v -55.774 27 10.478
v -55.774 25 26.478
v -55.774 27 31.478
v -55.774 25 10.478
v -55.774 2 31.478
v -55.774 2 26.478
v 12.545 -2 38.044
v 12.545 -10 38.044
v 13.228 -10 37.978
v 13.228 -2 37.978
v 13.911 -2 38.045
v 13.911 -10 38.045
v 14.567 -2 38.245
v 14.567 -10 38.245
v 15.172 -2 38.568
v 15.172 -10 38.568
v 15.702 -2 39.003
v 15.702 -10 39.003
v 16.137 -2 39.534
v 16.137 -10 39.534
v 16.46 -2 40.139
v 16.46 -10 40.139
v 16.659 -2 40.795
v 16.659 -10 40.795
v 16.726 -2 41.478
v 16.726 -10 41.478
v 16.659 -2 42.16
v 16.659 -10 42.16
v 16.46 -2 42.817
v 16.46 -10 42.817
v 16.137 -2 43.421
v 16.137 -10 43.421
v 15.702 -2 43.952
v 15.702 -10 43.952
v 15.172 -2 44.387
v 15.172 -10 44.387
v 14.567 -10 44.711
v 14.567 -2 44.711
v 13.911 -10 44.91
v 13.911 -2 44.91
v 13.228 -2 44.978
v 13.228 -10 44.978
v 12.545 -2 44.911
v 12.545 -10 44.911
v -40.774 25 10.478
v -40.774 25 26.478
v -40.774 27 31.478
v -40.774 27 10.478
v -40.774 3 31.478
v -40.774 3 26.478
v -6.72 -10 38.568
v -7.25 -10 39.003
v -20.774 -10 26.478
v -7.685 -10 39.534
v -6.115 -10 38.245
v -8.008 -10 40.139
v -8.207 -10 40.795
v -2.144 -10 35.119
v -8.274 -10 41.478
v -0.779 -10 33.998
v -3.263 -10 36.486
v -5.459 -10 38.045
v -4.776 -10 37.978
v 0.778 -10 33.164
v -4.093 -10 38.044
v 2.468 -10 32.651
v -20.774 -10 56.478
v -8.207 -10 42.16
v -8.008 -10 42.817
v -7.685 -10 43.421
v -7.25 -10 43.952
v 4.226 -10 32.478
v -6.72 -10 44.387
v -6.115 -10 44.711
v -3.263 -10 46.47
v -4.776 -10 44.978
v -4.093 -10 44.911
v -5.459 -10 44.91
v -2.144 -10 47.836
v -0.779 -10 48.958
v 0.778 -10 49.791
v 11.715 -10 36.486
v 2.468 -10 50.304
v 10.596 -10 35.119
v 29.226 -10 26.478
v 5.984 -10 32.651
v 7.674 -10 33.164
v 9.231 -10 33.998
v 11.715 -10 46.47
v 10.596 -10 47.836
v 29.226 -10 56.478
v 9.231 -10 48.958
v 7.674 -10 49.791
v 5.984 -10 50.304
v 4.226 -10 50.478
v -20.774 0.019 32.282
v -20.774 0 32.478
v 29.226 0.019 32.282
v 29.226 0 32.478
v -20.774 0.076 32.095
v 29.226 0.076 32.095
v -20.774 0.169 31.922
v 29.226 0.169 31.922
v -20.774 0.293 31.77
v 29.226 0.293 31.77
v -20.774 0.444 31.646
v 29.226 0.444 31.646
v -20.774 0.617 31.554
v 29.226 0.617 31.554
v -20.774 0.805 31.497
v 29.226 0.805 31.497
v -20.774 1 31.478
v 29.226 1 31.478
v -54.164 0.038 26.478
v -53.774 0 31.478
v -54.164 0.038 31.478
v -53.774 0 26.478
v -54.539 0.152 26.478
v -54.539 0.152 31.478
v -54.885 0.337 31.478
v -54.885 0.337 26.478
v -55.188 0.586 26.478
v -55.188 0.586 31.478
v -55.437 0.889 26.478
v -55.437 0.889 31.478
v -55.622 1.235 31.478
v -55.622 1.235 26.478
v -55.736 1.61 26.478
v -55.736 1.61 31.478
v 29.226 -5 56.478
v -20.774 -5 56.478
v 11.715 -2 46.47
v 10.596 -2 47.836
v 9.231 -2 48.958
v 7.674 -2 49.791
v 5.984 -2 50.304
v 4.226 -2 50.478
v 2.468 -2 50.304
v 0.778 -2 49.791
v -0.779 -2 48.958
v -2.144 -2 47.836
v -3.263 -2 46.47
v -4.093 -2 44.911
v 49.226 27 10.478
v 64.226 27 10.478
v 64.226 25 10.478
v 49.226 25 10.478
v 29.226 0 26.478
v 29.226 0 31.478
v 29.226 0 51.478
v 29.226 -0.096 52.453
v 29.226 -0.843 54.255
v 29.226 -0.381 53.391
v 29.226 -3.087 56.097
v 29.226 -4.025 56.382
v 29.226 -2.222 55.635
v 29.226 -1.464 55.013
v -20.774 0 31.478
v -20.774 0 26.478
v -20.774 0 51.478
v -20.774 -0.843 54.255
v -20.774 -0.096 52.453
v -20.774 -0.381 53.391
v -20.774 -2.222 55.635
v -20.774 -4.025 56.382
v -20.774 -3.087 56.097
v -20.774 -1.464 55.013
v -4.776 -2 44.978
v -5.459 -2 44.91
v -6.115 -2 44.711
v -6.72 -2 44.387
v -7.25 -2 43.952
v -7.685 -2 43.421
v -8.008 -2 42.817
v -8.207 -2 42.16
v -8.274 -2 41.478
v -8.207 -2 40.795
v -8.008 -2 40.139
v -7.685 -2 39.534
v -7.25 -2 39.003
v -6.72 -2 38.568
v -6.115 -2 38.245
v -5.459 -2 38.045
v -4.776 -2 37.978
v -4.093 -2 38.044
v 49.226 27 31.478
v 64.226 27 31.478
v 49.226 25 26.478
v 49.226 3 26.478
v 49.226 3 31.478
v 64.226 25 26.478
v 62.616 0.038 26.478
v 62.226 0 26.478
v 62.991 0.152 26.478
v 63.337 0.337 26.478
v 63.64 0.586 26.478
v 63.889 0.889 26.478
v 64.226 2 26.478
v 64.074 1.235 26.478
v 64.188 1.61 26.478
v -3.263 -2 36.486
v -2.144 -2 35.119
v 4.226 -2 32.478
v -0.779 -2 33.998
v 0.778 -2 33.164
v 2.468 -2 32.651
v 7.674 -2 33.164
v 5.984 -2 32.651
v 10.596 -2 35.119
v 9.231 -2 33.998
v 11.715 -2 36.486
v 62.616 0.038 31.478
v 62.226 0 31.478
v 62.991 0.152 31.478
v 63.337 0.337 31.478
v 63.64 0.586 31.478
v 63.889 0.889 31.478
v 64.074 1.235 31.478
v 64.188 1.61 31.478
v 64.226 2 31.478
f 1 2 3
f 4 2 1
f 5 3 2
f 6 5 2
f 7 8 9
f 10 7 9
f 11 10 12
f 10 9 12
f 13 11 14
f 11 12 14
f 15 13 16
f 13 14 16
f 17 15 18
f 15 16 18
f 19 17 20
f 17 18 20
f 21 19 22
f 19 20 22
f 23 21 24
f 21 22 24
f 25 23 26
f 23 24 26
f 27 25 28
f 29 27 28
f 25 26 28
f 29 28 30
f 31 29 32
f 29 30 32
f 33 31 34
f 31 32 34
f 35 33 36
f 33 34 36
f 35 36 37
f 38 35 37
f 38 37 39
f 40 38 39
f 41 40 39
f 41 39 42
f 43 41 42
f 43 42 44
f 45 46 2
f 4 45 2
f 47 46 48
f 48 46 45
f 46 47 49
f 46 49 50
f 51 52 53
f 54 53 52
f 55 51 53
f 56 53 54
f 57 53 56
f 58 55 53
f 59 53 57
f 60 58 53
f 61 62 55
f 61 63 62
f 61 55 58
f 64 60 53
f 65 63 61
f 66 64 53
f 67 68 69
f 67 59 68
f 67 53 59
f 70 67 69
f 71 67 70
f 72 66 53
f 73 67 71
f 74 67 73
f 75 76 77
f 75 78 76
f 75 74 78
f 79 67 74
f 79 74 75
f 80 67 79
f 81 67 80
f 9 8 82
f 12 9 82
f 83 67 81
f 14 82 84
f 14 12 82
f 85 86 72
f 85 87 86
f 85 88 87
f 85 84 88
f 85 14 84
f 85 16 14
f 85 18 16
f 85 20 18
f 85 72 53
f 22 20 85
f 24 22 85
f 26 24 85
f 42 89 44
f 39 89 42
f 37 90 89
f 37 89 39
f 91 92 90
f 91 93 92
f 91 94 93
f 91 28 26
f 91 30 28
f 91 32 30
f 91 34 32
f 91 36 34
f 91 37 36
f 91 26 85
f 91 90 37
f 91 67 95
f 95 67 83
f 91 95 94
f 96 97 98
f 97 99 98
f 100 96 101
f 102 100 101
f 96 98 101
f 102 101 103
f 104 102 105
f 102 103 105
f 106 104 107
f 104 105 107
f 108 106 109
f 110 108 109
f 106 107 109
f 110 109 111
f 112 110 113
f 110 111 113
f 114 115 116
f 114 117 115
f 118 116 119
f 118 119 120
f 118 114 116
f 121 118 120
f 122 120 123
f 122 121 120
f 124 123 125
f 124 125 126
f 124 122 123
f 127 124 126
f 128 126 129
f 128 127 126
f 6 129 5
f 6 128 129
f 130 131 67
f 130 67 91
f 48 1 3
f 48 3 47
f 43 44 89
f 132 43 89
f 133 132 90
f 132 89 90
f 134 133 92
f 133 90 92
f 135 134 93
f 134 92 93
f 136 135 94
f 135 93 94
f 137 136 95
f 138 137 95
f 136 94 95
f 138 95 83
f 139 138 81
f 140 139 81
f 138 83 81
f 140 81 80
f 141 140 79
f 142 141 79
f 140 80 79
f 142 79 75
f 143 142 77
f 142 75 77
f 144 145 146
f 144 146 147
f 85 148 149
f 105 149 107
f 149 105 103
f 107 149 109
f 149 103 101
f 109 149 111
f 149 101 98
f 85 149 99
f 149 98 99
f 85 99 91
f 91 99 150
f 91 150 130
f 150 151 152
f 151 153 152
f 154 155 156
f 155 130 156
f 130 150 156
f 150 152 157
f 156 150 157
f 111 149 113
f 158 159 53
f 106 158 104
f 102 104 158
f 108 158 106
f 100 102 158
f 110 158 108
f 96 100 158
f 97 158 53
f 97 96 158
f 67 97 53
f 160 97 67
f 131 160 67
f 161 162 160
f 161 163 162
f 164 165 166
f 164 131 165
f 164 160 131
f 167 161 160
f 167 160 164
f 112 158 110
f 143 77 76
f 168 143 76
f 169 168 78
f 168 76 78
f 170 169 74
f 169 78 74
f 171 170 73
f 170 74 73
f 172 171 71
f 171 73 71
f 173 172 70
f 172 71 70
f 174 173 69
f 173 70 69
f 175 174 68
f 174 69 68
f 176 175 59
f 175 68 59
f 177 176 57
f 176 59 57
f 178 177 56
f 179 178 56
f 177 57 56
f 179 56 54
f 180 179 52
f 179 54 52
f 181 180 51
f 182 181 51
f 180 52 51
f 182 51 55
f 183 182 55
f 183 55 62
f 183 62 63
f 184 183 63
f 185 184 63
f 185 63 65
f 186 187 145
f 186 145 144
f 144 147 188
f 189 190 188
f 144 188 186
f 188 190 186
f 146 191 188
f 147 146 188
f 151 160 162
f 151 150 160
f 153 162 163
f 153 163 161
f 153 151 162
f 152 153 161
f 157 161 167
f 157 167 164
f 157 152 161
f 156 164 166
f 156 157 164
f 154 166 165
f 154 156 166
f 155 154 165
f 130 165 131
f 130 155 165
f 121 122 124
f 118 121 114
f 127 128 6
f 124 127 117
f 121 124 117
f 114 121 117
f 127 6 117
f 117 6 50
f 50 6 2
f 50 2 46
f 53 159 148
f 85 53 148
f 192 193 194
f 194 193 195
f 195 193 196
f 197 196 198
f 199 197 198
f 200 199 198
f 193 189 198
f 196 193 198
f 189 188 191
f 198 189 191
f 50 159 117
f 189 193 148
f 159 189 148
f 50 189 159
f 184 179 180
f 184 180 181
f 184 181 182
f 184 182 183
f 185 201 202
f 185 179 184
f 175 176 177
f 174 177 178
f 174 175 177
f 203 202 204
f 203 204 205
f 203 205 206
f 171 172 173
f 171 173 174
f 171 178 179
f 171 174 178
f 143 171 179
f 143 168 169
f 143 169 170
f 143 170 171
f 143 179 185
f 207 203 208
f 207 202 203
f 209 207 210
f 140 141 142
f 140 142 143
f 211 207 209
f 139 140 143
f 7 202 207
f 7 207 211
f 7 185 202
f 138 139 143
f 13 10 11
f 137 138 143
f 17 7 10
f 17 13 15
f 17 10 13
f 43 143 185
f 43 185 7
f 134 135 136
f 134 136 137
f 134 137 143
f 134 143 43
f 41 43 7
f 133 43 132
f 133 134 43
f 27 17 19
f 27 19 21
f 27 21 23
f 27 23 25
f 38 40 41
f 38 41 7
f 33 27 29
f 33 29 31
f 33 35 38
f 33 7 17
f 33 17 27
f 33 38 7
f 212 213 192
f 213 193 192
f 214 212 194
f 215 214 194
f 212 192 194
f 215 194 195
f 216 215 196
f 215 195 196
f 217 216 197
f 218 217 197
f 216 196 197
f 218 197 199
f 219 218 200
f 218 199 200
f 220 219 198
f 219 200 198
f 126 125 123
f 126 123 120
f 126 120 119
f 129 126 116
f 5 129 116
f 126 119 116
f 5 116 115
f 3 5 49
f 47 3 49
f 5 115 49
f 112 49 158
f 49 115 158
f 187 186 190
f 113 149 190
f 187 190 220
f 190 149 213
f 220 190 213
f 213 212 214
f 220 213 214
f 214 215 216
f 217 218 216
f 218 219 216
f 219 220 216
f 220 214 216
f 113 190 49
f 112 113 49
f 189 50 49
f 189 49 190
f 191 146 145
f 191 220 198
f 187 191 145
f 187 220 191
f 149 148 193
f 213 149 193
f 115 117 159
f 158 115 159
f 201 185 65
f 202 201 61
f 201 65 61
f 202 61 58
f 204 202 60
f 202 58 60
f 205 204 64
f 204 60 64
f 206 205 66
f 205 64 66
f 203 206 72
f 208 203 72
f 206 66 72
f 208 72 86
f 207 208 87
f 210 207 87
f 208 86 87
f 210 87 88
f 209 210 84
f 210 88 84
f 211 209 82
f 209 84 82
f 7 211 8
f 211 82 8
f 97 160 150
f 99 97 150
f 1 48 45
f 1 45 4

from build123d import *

# Parameters (mm, degrees)
SKETCH_1_W          = 120
SKETCH_1_H          = 5
EXTRUDE_1_DEPTH     = 3
SKETCH_2_W          = 15
SKETCH_2_H          = 5
EXTRUDE_2_DEPTH     = 24
SKETCH_3_W          = 50
SKETCH_3_H          = 30
EXTRUDE_3_DEPTH     = 10
FILLET_6_R          = 1
FILLET_7_R          = 5
FILLET_9_R          = 2
FILLET_10_R         = 2
CUT_EXTRUDE_1_DEPTH = 8
SKETCH_5_W          = 15
SKETCH_5_H          = 2
EXTRUDE_4_DEPTH     = 16


with BuildPart() as part:
    # 草图1 → 凸台-拉伸1 (new body)
    with BuildSketch(Plane(origin=(0, 0, 0), x_dir=(1, 0, 0), z_dir=(0, 1, 0))):
        with Locations((4.226022422, -28.977588204)):
            Rectangle(SKETCH_1_W, SKETCH_1_H)
    extrude(amount=EXTRUDE_1_DEPTH)

    # 草图2 → 凸台-拉伸2 (add)
    with BuildSketch(Plane(origin=(0, 3, 0), x_dir=(1, 0, 0), z_dir=(0, 1, 0))):
        with Locations((-48.273977578, -28.977588204)):
            Rectangle(SKETCH_2_W, SKETCH_2_H)
        with Locations((56.726022422, -28.977588204)):
            Rectangle(SKETCH_2_W, SKETCH_2_H)
    extrude(amount=EXTRUDE_2_DEPTH)

    # 草图3 → 凸台-拉伸3 (add)
    with BuildSketch(Plane.XZ):
        with Locations((4.226022422, 41.477588204)):
            Rectangle(SKETCH_3_W, SKETCH_3_H)
    extrude(amount=EXTRUDE_3_DEPTH)

    # 圆角6
    fillet_6_edges = [part.edges().sort_by_distance(p)[0] for p in [
        (4.226022422, 0, 31.477588204),
    ]]
    fillet(fillet_6_edges, radius=FILLET_6_R)

    # 圆角7
    fillet_7_edges = [part.edges().sort_by_distance(p)[0] for p in [
        (4.226022422, 0, 56.477588204),
    ]]
    fillet(fillet_7_edges, radius=FILLET_7_R)

    # 圆角9
    fillet_9_edges = [part.edges().sort_by_distance(p)[0] for p in [
        (64.226022422, 0, 28.977588204),
    ]]
    fillet(fillet_9_edges, radius=FILLET_9_R)

    # 圆角10
    fillet_10_edges = [part.edges().sort_by_distance(p)[0] for p in [
        (-55.773977578, 0, 28.977588204),
    ]]
    fillet(fillet_10_edges, radius=FILLET_10_R)

    # 草图4 → 切除-拉伸1 (cut)
    with BuildSketch(Plane.XZ.offset(10)):
        with BuildLine():
            ThreePointArc((-4.093422023, 38.044390841), (4.226022422, 32.477588204), (12.545466866, 38.044390841))
            ThreePointArc((12.545466866, 38.044390841), (16.726022422, 41.477588204), (12.545466866, 44.910785567))
            ThreePointArc((12.545466866, 44.910785567), (4.226022422, 50.477588204), (-4.093422023, 44.910785567))
            ThreePointArc((-4.093422023, 44.910785567), (-8.273977578, 41.477588204), (-4.093422023, 38.044390841))
        make_face()
    extrude(amount=-CUT_EXTRUDE_1_DEPTH, mode=Mode.SUBTRACT)

    # 草图5 → 凸台-拉伸4 (add)
    with BuildSketch(Plane(origin=(0, 0, 26.477588204), x_dir=(-1, 0, 0), z_dir=(0, 0, -1))):
        with Locations((-56.726022422, 26)):
            Rectangle(SKETCH_5_W, SKETCH_5_H)
        with Locations((48.273977578, 26)):
            Rectangle(SKETCH_5_W, SKETCH_5_H)
    extrude(amount=EXTRUDE_4_DEPTH)


solid = part.part
